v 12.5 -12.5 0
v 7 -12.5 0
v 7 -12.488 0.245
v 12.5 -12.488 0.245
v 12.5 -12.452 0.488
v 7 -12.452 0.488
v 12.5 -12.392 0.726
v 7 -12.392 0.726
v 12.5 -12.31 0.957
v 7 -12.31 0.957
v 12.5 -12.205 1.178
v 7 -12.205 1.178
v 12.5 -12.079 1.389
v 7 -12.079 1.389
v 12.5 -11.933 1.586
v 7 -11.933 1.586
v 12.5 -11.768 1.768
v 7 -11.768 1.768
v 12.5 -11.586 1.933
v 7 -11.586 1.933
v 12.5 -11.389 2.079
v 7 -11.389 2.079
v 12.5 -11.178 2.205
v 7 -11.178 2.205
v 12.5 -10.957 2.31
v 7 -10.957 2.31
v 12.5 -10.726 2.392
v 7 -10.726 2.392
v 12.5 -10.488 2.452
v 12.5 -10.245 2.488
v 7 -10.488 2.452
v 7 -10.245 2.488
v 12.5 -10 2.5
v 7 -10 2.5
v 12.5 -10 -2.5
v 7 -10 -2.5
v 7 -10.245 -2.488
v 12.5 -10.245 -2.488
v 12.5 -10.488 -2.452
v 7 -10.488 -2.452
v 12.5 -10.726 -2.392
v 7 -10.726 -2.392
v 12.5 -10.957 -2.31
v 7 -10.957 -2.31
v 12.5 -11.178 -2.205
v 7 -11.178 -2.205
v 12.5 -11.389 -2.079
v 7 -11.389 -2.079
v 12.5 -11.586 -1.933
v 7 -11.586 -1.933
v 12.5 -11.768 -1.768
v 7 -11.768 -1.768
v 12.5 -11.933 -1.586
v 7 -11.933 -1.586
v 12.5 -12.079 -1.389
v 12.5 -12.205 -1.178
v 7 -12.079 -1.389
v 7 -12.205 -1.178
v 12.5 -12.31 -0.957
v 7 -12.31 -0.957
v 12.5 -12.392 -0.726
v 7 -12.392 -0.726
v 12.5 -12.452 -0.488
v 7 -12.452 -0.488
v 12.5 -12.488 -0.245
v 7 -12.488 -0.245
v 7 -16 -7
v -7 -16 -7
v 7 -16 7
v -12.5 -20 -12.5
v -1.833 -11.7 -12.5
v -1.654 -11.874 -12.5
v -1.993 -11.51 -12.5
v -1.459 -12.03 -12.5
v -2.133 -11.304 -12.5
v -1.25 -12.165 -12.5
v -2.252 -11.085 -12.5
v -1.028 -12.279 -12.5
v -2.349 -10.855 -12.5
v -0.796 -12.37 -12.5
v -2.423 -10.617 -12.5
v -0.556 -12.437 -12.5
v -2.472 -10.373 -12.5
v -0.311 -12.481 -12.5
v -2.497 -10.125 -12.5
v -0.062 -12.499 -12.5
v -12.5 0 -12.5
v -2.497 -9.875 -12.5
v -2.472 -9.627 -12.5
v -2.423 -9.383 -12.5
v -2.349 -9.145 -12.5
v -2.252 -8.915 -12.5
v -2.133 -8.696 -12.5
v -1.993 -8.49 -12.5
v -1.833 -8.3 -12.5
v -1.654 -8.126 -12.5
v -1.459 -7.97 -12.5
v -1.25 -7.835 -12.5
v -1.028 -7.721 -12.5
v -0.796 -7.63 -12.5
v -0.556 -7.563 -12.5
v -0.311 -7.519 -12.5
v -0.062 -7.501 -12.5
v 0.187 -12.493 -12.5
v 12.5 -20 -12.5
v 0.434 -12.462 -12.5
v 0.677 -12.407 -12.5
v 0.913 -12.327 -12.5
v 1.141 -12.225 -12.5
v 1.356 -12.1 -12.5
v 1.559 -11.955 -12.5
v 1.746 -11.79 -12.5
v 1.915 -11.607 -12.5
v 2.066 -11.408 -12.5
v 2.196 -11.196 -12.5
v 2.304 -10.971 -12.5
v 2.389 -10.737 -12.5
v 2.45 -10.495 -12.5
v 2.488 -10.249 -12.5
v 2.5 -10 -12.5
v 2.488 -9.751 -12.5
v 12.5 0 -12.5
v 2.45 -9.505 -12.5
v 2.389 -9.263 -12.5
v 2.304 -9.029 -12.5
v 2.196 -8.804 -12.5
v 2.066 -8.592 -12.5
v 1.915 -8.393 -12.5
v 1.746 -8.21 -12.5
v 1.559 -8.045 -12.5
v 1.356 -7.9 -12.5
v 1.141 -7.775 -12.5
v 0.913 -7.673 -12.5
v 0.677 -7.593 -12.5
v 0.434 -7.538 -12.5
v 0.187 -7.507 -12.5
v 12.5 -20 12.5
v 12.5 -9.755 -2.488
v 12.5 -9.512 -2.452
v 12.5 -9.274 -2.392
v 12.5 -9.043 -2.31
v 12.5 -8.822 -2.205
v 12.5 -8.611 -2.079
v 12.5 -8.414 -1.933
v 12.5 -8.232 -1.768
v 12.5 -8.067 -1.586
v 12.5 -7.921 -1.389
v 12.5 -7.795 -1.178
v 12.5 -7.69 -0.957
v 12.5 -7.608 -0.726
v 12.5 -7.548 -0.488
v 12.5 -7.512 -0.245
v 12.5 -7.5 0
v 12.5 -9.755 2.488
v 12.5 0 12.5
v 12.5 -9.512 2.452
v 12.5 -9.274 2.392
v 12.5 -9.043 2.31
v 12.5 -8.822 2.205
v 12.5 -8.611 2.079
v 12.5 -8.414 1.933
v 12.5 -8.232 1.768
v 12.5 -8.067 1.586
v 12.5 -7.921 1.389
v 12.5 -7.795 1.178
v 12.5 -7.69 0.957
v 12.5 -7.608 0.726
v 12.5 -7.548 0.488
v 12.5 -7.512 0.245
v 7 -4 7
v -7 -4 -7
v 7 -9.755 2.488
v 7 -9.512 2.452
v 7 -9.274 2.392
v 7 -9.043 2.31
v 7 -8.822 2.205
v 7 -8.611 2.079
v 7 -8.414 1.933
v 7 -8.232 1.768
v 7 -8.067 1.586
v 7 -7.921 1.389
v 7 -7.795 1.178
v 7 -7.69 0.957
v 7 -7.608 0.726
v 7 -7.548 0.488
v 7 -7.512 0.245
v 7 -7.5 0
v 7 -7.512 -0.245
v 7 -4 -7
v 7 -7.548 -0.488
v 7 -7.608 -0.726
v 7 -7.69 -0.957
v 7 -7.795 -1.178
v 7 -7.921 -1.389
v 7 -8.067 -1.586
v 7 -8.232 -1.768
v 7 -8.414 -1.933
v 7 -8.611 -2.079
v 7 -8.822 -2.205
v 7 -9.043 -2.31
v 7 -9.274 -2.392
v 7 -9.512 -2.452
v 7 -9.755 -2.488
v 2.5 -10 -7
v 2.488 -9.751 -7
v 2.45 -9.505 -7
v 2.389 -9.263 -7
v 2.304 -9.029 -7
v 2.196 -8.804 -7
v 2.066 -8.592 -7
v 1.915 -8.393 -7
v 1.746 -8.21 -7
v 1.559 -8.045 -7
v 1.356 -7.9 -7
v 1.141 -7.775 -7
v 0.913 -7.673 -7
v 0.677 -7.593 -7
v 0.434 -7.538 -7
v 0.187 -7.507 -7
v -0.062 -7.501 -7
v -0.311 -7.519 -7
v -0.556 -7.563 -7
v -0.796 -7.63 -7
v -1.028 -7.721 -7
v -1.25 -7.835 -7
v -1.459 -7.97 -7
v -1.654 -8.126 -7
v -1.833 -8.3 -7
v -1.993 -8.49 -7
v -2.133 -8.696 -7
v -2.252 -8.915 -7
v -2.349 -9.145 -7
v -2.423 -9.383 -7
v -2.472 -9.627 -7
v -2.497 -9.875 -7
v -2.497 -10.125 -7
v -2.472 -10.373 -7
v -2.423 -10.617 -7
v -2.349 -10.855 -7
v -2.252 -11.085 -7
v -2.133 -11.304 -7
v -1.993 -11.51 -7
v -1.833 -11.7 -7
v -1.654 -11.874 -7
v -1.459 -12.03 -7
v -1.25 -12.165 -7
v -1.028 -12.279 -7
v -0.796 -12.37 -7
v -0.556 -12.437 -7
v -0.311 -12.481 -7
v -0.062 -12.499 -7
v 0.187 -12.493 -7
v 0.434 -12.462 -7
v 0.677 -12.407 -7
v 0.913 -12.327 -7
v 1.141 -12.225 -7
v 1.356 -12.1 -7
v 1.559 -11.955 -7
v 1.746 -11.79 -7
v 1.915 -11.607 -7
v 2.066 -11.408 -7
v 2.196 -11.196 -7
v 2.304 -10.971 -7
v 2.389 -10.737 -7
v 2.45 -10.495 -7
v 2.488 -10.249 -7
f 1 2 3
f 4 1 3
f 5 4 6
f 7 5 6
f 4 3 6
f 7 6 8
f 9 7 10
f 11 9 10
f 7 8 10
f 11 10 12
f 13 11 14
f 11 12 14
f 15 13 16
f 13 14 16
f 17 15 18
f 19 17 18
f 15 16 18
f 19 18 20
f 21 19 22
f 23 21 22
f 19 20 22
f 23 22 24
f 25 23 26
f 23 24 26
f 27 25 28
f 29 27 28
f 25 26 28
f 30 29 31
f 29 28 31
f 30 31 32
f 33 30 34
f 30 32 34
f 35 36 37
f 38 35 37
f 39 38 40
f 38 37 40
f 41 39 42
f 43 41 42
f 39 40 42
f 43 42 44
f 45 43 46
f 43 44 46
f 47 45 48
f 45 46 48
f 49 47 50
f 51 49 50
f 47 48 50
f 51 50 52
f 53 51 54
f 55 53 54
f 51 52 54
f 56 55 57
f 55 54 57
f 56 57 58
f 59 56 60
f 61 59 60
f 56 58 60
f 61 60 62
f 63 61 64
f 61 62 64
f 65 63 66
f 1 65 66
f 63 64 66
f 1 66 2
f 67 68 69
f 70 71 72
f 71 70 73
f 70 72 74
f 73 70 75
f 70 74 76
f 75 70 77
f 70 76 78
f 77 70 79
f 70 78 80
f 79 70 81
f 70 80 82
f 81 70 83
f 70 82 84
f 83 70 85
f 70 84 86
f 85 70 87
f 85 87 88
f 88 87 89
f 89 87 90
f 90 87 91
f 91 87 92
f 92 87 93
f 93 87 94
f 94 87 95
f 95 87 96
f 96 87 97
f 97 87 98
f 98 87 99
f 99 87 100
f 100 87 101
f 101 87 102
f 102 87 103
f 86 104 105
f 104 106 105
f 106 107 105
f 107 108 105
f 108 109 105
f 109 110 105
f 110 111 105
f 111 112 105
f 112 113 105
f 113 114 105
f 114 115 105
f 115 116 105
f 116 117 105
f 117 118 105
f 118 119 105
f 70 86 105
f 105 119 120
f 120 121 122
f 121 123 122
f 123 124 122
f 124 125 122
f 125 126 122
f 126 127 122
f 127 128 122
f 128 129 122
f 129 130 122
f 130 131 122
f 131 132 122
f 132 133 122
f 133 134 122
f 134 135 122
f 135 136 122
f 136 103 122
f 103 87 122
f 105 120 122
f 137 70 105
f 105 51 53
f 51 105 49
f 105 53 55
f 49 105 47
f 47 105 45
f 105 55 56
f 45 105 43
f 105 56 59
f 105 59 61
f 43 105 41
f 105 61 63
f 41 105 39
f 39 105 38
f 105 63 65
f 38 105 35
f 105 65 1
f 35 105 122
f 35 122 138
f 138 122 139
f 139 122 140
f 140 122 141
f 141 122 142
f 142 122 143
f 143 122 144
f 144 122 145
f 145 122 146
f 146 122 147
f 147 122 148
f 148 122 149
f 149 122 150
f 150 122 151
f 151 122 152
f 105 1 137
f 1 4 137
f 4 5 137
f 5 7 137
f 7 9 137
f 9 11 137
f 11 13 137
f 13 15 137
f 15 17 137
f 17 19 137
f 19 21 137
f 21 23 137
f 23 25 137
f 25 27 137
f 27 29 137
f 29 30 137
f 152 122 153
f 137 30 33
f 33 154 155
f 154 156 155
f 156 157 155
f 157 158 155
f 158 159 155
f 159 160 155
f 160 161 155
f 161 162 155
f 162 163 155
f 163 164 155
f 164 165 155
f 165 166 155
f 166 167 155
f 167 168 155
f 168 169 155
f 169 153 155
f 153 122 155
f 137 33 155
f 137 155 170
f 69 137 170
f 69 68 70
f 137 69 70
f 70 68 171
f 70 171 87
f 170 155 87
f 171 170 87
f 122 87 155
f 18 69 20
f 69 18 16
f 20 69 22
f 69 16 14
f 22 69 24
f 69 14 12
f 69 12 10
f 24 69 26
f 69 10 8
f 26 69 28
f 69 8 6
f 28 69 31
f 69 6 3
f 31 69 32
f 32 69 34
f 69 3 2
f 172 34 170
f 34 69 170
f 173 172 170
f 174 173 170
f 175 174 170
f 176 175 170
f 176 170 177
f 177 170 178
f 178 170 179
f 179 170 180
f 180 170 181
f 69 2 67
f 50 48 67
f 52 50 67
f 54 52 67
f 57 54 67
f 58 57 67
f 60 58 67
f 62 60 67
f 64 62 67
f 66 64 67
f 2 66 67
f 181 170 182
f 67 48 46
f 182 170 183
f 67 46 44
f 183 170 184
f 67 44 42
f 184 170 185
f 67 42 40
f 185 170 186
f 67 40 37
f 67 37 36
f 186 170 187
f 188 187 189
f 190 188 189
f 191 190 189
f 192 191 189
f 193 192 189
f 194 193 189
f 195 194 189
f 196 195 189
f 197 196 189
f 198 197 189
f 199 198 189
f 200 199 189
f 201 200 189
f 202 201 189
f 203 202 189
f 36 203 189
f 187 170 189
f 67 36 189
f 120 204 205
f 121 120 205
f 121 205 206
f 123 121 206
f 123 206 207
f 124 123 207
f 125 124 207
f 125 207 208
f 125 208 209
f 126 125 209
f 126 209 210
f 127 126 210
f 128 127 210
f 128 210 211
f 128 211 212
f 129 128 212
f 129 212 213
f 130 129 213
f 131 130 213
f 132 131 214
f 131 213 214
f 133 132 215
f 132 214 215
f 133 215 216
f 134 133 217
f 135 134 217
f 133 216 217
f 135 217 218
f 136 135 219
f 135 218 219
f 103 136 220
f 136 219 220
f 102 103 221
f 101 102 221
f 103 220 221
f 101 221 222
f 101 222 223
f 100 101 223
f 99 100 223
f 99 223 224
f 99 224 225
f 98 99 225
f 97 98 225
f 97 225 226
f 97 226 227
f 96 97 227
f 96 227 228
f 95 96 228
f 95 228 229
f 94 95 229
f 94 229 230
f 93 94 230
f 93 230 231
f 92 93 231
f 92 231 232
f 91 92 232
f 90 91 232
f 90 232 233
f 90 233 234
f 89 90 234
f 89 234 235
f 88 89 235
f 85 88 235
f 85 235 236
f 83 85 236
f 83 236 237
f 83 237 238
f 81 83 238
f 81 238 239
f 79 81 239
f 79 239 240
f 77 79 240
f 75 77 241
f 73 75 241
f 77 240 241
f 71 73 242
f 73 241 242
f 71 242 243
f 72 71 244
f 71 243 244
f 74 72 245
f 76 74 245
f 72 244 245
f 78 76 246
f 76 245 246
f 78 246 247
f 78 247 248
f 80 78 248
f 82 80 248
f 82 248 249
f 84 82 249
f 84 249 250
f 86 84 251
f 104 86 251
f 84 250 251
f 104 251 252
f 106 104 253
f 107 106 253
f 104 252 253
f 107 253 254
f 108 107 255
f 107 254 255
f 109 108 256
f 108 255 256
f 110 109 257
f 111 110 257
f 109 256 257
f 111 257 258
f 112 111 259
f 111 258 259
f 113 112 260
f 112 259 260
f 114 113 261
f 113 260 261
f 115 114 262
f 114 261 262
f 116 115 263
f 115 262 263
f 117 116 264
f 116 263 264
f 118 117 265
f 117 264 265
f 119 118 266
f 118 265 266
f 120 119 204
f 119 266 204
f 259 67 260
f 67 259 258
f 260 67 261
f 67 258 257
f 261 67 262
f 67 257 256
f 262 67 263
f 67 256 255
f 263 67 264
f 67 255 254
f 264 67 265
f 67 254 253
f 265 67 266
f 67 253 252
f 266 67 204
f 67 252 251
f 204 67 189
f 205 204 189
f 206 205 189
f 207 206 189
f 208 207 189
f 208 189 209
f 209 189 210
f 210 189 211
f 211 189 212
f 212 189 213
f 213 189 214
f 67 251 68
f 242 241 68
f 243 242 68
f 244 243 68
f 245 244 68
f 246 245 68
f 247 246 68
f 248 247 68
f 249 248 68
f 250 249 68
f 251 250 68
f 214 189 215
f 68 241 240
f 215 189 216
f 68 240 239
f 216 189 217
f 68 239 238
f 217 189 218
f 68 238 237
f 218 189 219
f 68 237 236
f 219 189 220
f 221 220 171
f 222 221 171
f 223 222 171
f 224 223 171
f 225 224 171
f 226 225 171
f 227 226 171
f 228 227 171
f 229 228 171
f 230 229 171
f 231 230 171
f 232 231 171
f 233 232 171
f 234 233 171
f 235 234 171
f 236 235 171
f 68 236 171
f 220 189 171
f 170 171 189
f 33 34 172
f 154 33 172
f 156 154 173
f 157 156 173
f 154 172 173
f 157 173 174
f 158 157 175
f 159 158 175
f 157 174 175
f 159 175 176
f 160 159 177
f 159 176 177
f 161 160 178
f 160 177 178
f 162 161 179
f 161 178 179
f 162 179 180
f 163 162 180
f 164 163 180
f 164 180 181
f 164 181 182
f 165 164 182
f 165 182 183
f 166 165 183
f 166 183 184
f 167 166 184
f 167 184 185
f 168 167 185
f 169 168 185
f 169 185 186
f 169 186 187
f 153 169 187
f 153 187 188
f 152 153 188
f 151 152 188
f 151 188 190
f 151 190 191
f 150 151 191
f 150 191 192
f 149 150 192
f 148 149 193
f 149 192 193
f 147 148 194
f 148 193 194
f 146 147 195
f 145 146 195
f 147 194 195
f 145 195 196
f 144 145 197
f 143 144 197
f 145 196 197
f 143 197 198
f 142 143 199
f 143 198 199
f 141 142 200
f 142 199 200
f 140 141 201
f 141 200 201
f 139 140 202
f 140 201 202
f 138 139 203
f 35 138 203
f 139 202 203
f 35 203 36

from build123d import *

# Parameters (mm, degrees)
F1_DEPTH = 20
F2_DEPTH = 4
F4_DEPTH = 4
F6_DEPTH = 25.4
F7_R     = 2.5
F8_DEPTH = 25.4


with BuildPart() as f1:
    # F0 (on Front) → F1 (new body)
    with BuildSketch(Plane.XZ):
        Polygon((-7, -7), (-12.5, -12.5), (7, -12.5), (12.5, -12.5), (12.5, -7), (12.5, 12.5), (7, 7), (7, -7), align=None)
    extrude(amount=F1_DEPTH)

    # F0 (on Front) → F2 (join)
    with BuildSketch(Plane.XZ):
        Polygon((-7, -7), (-12.5, -12.5), (7, -12.5), (12.5, -12.5), (12.5, -7), (12.5, 12.5), (7, 7), (7, -7), align=None)
        Polygon((7, 7), (-7, -7), (7, -7), align=None)
    extrude(amount=F2_DEPTH)

    # F3 (on face) → F4 (join)
    with BuildSketch(Plane.XZ.offset(20)):
        Polygon((12.5, 12.5), (-12.5, -12.5), (12.5, -12.5), align=None)
    extrude(amount=-F4_DEPTH)

    # F5 (on face) → F6 (cut)
    with BuildSketch(Plane(origin=(7, 0, 0), x_dir=(0, -1, 0), z_dir=(-1, 0, 0))):
        with BuildLine():
            Line((10, 2.5), (10, -2.5))
            ThreePointArc((10, -2.5), (11.767767, -1.767767), (12.5, 0))
            ThreePointArc((12.5, 0), (11.767767, 1.767767), (10, 2.5))
        make_face()
        with BuildLine():
            ThreePointArc((10, 2.5), (7.5, 0), (10, -2.5))
            Line((10, -2.5), (10, 2.5))
        make_face()
    extrude(amount=-F6_DEPTH, mode=Mode.SUBTRACT)

    # F7 (on face) → F8 (cut)
    with BuildSketch(Plane.XY.offset(-7)):
        with Locations((0, -10)):
            Circle(F7_R)
    extrude(amount=-F8_DEPTH, mode=Mode.SUBTRACT)


solid = f1.part
